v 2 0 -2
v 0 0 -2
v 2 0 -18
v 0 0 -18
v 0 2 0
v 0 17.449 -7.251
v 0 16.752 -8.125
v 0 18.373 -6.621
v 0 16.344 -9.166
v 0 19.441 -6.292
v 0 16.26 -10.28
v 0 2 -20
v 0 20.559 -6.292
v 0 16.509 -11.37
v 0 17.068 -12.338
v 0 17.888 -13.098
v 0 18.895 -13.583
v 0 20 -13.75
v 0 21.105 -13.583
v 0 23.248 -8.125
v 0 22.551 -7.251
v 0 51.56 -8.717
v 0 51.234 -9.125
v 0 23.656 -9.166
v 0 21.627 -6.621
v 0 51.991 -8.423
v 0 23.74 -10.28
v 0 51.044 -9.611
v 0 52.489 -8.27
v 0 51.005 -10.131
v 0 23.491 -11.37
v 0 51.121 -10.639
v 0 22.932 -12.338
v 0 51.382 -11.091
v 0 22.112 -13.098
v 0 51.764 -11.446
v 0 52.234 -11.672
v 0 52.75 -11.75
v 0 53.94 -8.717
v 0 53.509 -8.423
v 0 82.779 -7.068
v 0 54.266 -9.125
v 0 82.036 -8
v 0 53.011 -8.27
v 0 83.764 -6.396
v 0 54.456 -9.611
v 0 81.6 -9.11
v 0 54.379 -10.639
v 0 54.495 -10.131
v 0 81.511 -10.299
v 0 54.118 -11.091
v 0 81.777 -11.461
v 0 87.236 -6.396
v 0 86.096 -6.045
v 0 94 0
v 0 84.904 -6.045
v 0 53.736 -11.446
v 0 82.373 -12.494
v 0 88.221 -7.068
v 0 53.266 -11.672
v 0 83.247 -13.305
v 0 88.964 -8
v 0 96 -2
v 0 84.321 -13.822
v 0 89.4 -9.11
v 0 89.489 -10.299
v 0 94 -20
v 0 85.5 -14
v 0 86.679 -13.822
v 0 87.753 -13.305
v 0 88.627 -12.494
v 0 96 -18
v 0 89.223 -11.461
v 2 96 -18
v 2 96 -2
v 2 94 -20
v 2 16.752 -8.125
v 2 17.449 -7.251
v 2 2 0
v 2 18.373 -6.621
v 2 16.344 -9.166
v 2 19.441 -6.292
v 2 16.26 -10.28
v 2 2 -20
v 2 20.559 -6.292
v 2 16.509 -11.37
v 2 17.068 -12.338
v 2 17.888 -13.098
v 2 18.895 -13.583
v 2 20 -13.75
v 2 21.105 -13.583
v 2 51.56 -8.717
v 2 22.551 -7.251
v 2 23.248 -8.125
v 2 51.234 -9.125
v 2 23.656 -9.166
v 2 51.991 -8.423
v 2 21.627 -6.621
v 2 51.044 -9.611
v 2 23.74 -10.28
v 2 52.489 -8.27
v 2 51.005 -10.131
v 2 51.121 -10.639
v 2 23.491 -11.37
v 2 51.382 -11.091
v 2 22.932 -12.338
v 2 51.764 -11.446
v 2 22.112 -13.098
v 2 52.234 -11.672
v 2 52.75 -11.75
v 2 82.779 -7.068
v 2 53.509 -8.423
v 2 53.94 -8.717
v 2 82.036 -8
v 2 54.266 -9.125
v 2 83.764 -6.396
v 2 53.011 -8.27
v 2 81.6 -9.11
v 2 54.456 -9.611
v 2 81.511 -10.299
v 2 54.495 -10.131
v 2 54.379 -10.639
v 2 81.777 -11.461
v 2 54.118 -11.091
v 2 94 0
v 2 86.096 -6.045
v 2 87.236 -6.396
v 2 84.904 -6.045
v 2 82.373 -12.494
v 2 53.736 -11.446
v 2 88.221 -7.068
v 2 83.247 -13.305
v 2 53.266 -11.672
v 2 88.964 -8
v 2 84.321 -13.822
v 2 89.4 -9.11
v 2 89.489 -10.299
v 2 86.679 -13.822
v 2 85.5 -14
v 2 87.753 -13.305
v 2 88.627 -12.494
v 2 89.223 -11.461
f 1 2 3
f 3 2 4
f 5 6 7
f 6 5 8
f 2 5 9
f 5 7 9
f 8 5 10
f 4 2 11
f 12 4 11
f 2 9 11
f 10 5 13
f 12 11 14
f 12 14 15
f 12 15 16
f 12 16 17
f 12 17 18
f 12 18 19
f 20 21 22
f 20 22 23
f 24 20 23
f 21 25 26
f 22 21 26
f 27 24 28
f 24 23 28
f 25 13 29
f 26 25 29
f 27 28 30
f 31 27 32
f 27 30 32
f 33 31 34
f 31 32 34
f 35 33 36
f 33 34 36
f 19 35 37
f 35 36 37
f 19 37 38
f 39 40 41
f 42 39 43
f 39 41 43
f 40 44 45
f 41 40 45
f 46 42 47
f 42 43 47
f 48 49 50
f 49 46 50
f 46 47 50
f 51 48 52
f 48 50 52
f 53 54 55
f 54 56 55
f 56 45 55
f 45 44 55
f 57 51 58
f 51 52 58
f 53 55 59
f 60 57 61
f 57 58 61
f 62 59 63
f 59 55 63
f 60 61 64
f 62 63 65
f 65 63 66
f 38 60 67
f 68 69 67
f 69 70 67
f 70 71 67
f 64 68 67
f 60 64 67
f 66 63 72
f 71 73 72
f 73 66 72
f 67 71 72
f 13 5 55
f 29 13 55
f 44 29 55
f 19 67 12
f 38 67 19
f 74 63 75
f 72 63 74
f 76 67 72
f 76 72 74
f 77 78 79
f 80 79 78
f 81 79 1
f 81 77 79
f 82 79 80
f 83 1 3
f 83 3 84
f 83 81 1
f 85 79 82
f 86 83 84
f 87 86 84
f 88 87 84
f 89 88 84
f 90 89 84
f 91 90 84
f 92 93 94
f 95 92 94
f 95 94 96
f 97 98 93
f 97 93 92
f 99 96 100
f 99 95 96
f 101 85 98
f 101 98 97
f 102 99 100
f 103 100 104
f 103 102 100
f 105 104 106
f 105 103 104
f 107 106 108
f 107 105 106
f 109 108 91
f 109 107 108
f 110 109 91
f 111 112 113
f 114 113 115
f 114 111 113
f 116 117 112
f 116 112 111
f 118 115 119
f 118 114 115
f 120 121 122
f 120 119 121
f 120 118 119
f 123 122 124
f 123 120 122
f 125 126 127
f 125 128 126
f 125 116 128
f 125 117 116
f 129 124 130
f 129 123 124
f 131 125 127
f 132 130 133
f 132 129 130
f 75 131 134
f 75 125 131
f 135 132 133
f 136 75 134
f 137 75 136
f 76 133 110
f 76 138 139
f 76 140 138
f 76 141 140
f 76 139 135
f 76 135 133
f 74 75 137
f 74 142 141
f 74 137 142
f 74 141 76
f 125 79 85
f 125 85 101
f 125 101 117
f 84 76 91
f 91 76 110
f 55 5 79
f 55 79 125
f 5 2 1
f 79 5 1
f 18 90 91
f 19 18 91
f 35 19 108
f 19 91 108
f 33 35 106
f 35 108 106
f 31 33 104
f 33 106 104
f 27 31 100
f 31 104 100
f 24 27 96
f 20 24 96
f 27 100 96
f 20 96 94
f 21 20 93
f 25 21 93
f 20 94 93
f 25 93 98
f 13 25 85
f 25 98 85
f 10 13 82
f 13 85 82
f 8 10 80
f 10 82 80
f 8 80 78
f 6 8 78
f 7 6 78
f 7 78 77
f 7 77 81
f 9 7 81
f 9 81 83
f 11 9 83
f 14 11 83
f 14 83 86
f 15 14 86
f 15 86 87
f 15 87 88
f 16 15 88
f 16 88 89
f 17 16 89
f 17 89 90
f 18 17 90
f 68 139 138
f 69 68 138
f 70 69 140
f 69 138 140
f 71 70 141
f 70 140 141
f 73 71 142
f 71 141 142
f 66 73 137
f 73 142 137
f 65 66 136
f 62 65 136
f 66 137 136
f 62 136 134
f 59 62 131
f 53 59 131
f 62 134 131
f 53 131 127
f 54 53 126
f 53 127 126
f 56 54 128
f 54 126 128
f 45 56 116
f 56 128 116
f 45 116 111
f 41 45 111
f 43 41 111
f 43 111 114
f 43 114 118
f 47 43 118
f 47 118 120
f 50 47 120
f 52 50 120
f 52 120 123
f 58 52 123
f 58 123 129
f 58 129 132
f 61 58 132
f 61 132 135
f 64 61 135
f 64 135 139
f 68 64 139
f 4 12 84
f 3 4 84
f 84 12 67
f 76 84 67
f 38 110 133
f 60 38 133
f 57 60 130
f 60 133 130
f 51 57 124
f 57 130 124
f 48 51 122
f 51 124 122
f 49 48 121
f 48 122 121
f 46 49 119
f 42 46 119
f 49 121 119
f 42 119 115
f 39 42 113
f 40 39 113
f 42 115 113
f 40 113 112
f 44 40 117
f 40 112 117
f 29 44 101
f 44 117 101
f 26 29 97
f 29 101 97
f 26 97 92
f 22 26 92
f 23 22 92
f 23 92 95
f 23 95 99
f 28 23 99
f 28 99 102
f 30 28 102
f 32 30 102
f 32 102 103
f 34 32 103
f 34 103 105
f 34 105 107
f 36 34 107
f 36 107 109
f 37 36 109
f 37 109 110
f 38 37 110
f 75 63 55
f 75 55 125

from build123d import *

# Parameters (mm, degrees)
SKETCH1_W           = 20
SKETCH1_H           = 96
BOSS_EXTRUDE1_DEPTH = 2
SKETCH2_R           = 4
SKETCH2_R_2         = 1.75
SKETCH2_R_3         = 3.75
CUT_EXTRUDE1_DEPTH  = 99.081598682
CHAMFER1_SIZE       = 2


with BuildPart() as part:
    # Sketch1 → Boss-Extrude1 (new body)
    with BuildSketch(Plane(origin=(0, 0, 0), x_dir=(0, 0, -1), z_dir=(1, 0, 0))):
        with Locations((10, 48)):
            Rectangle(SKETCH1_W, SKETCH1_H)
    extrude(amount=BOSS_EXTRUDE1_DEPTH)

    # Sketch2 → Cut-Extrude1 (cut, through all)
    with BuildSketch(Plane(origin=(2, 0, 0), x_dir=(0, 0, -1), z_dir=(1, 0, 0))):
        with Locations((10, 85.5)):
            Circle(SKETCH2_R)
        with Locations((10, 52.75)):
            Circle(SKETCH2_R_2)
        with Locations((10, 20)):
            Circle(SKETCH2_R_3)
    extrude(amount=-CUT_EXTRUDE1_DEPTH, mode=Mode.SUBTRACT)

    # Chamfer1
    chamfer1_edges = [part.edges().sort_by_distance(p)[0] for p in [
        (1, 96, 0),
        (1, 96, -20),
        (1, 0, -20),
        (1, 0, 0),
    ]]
    chamfer(chamfer1_edges, length=CHAMFER1_SIZE)


solid = part.part
